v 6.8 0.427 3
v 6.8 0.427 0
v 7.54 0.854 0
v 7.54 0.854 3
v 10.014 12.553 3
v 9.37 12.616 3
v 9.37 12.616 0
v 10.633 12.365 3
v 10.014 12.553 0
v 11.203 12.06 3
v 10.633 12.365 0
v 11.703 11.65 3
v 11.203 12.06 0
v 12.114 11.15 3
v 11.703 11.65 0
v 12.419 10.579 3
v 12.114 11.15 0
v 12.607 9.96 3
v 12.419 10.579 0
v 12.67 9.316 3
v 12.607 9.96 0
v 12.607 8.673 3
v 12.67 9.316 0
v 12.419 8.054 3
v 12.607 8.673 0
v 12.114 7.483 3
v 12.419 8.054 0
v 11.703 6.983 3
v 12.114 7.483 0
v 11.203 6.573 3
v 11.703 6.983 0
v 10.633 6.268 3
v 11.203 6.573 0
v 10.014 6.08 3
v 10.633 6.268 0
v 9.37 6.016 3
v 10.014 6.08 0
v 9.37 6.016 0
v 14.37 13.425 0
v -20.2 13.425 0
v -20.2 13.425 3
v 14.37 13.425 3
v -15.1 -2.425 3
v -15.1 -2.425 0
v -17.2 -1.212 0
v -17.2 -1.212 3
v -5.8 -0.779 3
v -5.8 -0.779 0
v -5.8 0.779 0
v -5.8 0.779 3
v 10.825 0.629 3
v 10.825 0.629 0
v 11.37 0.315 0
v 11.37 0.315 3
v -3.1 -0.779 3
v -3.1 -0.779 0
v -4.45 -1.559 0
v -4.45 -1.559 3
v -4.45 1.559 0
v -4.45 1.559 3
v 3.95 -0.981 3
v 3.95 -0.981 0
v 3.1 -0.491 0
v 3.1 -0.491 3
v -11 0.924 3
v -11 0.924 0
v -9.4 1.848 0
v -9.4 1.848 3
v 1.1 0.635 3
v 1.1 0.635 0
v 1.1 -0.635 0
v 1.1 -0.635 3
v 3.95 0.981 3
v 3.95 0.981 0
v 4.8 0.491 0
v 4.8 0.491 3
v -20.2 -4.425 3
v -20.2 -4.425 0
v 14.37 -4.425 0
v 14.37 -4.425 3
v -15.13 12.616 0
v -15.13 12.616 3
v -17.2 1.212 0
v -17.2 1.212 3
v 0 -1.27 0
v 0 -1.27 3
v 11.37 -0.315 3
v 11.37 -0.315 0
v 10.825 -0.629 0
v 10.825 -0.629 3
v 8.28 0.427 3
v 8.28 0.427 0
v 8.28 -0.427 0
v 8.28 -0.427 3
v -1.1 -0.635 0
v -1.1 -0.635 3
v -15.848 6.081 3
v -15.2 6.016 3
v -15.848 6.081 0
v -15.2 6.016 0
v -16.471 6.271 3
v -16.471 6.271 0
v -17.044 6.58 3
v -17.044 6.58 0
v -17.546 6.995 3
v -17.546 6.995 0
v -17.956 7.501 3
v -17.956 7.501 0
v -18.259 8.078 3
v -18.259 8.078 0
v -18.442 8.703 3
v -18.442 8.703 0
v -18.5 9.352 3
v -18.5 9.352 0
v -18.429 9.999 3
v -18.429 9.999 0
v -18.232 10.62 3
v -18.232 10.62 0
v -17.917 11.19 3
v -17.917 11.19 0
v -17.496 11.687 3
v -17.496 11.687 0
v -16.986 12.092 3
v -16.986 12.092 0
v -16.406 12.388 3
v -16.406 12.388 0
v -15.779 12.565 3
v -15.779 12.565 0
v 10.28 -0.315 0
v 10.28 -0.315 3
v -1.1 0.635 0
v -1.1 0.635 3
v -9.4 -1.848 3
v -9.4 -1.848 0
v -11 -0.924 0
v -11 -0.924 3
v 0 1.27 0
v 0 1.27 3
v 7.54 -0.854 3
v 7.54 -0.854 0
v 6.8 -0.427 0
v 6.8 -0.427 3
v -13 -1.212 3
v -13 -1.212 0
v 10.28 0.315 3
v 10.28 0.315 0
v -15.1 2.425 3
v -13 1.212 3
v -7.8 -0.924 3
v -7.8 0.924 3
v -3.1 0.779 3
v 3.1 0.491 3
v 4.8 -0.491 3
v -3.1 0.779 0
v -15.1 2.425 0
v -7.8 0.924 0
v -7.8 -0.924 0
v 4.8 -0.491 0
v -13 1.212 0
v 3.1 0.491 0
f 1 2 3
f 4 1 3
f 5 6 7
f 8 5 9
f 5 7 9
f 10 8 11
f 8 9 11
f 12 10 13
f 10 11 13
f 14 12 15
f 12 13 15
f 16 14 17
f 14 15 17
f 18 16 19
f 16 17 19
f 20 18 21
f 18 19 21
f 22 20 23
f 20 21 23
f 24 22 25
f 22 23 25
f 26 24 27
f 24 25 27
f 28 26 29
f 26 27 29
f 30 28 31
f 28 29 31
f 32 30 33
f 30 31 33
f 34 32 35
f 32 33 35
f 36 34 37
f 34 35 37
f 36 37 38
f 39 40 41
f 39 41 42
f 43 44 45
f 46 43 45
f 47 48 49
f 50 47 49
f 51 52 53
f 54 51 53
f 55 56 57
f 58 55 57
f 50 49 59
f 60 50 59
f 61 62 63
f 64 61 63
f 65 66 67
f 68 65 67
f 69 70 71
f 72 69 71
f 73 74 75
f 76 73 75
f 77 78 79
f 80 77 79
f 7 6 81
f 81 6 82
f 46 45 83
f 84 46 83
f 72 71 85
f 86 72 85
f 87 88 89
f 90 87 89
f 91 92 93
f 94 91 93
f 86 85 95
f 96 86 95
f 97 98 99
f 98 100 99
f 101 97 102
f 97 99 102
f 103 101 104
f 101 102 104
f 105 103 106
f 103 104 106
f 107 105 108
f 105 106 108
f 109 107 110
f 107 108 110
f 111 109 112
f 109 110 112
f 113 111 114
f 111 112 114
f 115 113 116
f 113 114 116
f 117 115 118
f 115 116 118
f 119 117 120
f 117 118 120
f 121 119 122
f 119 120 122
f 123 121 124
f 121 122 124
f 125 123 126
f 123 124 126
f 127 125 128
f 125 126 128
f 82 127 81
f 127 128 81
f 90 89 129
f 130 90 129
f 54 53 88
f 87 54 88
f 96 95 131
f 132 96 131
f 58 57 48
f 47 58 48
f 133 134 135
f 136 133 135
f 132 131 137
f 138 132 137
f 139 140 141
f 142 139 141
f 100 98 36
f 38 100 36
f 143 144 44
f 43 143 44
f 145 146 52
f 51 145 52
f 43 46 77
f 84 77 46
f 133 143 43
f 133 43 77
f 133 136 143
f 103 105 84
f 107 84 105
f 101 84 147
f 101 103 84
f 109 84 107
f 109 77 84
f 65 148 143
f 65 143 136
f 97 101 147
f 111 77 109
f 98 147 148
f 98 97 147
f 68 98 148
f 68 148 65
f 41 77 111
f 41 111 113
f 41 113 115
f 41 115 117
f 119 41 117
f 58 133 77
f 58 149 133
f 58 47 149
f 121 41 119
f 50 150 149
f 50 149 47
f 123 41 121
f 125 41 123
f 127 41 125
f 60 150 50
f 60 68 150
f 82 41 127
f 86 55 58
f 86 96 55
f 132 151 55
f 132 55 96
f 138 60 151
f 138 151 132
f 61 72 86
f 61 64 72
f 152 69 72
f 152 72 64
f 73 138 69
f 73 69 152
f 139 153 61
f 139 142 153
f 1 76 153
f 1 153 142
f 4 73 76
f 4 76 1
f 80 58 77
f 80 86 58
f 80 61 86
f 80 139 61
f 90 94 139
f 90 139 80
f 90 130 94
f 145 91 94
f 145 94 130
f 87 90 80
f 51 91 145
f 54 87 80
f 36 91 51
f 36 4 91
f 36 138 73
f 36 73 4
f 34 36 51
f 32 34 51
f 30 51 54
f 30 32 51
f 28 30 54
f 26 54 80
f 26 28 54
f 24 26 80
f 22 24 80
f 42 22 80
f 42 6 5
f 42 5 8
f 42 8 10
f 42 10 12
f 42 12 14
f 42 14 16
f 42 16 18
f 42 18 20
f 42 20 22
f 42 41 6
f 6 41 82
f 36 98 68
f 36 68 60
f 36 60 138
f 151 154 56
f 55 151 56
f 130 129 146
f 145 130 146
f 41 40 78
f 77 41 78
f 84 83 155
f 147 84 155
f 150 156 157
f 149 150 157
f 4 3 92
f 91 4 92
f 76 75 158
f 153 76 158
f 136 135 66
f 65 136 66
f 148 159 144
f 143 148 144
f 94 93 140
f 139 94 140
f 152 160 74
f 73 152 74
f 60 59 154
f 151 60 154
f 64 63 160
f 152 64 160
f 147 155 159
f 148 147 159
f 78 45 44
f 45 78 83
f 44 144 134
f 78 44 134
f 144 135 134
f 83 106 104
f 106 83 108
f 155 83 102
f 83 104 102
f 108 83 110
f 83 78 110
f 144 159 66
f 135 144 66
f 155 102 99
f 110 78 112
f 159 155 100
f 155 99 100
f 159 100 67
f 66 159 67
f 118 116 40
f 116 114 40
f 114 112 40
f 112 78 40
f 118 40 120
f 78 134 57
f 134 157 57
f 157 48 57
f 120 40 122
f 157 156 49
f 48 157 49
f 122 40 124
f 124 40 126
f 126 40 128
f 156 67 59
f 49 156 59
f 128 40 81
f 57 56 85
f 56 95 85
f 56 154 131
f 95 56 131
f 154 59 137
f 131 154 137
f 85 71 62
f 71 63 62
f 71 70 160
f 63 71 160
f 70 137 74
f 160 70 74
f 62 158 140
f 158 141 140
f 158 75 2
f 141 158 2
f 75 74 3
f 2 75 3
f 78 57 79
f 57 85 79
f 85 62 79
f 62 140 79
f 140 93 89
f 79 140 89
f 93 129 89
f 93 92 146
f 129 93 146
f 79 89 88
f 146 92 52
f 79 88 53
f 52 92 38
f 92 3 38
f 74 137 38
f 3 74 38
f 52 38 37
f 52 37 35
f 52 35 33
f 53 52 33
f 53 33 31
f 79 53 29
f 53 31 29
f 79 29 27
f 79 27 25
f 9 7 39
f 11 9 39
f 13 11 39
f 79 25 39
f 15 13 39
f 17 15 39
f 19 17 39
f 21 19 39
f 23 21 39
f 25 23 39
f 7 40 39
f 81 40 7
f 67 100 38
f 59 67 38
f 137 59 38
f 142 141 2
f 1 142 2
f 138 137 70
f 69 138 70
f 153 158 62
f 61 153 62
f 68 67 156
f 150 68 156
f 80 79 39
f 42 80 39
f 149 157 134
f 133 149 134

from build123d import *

# Parameters (mm, degrees)
F0_W     = 34.57
F0_H     = 9
F0_H_2   = 8.8497422612
F1_DEPTH = 3
F3_D     = 6.6
F5_DEPTH = 25


with BuildPart() as f1:
    # F0 (on Top) → F1 (new body)
    with BuildSketch(Plane.XY):
        with Locations((-2.915, 8.9248711306)):
            Rectangle(F0_W, F0_H)
        with Locations((-2.915, 0)):
            Rectangle(F0_W, F0_H_2)
        Polygon((-15.1, 2.4248711306), (-13, 1.2124355653), (-13, -1.2124355653), (-15.1, -2.4248711306), (-17.2, -1.2124355653), (-17.2, 1.2124355653), align=None, mode=Mode.SUBTRACT)
        Polygon((-9.4, 1.8475208614), (-7.8, 0.9237604307), (-7.8, -0.9237604307), (-9.4, -1.8475208614), (-11, -0.9237604307), (-11, 0.9237604307), align=None, mode=Mode.SUBTRACT)
        Polygon((-4.45, 1.5588457268), (-3.1, 0.7794228634), (-3.1, -0.7794228634), (-4.45, -1.5588457268), (-5.8, -0.7794228634), (-5.8, 0.7794228634), align=None, mode=Mode.SUBTRACT)
        Polygon((0, 1.2701705922), (1.1, 0.6350852961), (1.1, -0.6350852961), (0, -1.2701705922), (-1.1, -0.6350852961), (-1.1, 0.6350852961), align=None, mode=Mode.SUBTRACT)
        Polygon((3.95, 0.9814954576), (4.8, 0.4907477288), (4.8, -0.4907477288), (3.95, -0.9814954576), (3.1, -0.4907477288), (3.1, 0.4907477288), align=None, mode=Mode.SUBTRACT)
        Polygon((7.54, 0.8544783984), (8.28, 0.4272391992), (8.28, -0.4272391992), (7.54, -0.8544783984), (6.8, -0.4272391992), (6.8, 0.4272391992), align=None, mode=Mode.SUBTRACT)
        Polygon((10.825, 0.6293117934), (11.37, 0.3146558967), (11.37, -0.3146558967), (10.825, -0.6293117934), (10.28, -0.3146558967), (10.28, 0.3146558967), align=None, mode=Mode.SUBTRACT)
    extrude(amount=F1_DEPTH)

    # F3 (through all)
    with Locations(Plane.XY.offset(3)):
        with Locations((-15.2, 9.3164853752), (9.37, 9.3164853752)):
            Hole(F3_D / 2)

    # F4 (on face) → F5 (cut)
    with BuildSketch(Plane.XY.offset(3)):
        with BuildLine():
            Line((9.3698995221, 12.6164853736), (-15.1298372011, 12.6157394093))
            ThreePointArc((-15.1298372011, 12.6157394093), (-12.8418717978, 11.6249981826), (-11.9, 9.3164853752))
            ThreePointArc((-11.9, 9.3164853752), (-12.866547622, 6.9830329973), (-15.1999999998, 6.0164853752))
            Line((-15.1999999998, 6.0164853752), (9.3698995221, 6.0164853767))
            ThreePointArc((9.3698995221, 6.0164853767), (6.07, 9.3164853752), (9.3698995221, 12.6164853736))
        make_face()
    extrude(amount=-F5_DEPTH, mode=Mode.SUBTRACT)


solid = f1.part
